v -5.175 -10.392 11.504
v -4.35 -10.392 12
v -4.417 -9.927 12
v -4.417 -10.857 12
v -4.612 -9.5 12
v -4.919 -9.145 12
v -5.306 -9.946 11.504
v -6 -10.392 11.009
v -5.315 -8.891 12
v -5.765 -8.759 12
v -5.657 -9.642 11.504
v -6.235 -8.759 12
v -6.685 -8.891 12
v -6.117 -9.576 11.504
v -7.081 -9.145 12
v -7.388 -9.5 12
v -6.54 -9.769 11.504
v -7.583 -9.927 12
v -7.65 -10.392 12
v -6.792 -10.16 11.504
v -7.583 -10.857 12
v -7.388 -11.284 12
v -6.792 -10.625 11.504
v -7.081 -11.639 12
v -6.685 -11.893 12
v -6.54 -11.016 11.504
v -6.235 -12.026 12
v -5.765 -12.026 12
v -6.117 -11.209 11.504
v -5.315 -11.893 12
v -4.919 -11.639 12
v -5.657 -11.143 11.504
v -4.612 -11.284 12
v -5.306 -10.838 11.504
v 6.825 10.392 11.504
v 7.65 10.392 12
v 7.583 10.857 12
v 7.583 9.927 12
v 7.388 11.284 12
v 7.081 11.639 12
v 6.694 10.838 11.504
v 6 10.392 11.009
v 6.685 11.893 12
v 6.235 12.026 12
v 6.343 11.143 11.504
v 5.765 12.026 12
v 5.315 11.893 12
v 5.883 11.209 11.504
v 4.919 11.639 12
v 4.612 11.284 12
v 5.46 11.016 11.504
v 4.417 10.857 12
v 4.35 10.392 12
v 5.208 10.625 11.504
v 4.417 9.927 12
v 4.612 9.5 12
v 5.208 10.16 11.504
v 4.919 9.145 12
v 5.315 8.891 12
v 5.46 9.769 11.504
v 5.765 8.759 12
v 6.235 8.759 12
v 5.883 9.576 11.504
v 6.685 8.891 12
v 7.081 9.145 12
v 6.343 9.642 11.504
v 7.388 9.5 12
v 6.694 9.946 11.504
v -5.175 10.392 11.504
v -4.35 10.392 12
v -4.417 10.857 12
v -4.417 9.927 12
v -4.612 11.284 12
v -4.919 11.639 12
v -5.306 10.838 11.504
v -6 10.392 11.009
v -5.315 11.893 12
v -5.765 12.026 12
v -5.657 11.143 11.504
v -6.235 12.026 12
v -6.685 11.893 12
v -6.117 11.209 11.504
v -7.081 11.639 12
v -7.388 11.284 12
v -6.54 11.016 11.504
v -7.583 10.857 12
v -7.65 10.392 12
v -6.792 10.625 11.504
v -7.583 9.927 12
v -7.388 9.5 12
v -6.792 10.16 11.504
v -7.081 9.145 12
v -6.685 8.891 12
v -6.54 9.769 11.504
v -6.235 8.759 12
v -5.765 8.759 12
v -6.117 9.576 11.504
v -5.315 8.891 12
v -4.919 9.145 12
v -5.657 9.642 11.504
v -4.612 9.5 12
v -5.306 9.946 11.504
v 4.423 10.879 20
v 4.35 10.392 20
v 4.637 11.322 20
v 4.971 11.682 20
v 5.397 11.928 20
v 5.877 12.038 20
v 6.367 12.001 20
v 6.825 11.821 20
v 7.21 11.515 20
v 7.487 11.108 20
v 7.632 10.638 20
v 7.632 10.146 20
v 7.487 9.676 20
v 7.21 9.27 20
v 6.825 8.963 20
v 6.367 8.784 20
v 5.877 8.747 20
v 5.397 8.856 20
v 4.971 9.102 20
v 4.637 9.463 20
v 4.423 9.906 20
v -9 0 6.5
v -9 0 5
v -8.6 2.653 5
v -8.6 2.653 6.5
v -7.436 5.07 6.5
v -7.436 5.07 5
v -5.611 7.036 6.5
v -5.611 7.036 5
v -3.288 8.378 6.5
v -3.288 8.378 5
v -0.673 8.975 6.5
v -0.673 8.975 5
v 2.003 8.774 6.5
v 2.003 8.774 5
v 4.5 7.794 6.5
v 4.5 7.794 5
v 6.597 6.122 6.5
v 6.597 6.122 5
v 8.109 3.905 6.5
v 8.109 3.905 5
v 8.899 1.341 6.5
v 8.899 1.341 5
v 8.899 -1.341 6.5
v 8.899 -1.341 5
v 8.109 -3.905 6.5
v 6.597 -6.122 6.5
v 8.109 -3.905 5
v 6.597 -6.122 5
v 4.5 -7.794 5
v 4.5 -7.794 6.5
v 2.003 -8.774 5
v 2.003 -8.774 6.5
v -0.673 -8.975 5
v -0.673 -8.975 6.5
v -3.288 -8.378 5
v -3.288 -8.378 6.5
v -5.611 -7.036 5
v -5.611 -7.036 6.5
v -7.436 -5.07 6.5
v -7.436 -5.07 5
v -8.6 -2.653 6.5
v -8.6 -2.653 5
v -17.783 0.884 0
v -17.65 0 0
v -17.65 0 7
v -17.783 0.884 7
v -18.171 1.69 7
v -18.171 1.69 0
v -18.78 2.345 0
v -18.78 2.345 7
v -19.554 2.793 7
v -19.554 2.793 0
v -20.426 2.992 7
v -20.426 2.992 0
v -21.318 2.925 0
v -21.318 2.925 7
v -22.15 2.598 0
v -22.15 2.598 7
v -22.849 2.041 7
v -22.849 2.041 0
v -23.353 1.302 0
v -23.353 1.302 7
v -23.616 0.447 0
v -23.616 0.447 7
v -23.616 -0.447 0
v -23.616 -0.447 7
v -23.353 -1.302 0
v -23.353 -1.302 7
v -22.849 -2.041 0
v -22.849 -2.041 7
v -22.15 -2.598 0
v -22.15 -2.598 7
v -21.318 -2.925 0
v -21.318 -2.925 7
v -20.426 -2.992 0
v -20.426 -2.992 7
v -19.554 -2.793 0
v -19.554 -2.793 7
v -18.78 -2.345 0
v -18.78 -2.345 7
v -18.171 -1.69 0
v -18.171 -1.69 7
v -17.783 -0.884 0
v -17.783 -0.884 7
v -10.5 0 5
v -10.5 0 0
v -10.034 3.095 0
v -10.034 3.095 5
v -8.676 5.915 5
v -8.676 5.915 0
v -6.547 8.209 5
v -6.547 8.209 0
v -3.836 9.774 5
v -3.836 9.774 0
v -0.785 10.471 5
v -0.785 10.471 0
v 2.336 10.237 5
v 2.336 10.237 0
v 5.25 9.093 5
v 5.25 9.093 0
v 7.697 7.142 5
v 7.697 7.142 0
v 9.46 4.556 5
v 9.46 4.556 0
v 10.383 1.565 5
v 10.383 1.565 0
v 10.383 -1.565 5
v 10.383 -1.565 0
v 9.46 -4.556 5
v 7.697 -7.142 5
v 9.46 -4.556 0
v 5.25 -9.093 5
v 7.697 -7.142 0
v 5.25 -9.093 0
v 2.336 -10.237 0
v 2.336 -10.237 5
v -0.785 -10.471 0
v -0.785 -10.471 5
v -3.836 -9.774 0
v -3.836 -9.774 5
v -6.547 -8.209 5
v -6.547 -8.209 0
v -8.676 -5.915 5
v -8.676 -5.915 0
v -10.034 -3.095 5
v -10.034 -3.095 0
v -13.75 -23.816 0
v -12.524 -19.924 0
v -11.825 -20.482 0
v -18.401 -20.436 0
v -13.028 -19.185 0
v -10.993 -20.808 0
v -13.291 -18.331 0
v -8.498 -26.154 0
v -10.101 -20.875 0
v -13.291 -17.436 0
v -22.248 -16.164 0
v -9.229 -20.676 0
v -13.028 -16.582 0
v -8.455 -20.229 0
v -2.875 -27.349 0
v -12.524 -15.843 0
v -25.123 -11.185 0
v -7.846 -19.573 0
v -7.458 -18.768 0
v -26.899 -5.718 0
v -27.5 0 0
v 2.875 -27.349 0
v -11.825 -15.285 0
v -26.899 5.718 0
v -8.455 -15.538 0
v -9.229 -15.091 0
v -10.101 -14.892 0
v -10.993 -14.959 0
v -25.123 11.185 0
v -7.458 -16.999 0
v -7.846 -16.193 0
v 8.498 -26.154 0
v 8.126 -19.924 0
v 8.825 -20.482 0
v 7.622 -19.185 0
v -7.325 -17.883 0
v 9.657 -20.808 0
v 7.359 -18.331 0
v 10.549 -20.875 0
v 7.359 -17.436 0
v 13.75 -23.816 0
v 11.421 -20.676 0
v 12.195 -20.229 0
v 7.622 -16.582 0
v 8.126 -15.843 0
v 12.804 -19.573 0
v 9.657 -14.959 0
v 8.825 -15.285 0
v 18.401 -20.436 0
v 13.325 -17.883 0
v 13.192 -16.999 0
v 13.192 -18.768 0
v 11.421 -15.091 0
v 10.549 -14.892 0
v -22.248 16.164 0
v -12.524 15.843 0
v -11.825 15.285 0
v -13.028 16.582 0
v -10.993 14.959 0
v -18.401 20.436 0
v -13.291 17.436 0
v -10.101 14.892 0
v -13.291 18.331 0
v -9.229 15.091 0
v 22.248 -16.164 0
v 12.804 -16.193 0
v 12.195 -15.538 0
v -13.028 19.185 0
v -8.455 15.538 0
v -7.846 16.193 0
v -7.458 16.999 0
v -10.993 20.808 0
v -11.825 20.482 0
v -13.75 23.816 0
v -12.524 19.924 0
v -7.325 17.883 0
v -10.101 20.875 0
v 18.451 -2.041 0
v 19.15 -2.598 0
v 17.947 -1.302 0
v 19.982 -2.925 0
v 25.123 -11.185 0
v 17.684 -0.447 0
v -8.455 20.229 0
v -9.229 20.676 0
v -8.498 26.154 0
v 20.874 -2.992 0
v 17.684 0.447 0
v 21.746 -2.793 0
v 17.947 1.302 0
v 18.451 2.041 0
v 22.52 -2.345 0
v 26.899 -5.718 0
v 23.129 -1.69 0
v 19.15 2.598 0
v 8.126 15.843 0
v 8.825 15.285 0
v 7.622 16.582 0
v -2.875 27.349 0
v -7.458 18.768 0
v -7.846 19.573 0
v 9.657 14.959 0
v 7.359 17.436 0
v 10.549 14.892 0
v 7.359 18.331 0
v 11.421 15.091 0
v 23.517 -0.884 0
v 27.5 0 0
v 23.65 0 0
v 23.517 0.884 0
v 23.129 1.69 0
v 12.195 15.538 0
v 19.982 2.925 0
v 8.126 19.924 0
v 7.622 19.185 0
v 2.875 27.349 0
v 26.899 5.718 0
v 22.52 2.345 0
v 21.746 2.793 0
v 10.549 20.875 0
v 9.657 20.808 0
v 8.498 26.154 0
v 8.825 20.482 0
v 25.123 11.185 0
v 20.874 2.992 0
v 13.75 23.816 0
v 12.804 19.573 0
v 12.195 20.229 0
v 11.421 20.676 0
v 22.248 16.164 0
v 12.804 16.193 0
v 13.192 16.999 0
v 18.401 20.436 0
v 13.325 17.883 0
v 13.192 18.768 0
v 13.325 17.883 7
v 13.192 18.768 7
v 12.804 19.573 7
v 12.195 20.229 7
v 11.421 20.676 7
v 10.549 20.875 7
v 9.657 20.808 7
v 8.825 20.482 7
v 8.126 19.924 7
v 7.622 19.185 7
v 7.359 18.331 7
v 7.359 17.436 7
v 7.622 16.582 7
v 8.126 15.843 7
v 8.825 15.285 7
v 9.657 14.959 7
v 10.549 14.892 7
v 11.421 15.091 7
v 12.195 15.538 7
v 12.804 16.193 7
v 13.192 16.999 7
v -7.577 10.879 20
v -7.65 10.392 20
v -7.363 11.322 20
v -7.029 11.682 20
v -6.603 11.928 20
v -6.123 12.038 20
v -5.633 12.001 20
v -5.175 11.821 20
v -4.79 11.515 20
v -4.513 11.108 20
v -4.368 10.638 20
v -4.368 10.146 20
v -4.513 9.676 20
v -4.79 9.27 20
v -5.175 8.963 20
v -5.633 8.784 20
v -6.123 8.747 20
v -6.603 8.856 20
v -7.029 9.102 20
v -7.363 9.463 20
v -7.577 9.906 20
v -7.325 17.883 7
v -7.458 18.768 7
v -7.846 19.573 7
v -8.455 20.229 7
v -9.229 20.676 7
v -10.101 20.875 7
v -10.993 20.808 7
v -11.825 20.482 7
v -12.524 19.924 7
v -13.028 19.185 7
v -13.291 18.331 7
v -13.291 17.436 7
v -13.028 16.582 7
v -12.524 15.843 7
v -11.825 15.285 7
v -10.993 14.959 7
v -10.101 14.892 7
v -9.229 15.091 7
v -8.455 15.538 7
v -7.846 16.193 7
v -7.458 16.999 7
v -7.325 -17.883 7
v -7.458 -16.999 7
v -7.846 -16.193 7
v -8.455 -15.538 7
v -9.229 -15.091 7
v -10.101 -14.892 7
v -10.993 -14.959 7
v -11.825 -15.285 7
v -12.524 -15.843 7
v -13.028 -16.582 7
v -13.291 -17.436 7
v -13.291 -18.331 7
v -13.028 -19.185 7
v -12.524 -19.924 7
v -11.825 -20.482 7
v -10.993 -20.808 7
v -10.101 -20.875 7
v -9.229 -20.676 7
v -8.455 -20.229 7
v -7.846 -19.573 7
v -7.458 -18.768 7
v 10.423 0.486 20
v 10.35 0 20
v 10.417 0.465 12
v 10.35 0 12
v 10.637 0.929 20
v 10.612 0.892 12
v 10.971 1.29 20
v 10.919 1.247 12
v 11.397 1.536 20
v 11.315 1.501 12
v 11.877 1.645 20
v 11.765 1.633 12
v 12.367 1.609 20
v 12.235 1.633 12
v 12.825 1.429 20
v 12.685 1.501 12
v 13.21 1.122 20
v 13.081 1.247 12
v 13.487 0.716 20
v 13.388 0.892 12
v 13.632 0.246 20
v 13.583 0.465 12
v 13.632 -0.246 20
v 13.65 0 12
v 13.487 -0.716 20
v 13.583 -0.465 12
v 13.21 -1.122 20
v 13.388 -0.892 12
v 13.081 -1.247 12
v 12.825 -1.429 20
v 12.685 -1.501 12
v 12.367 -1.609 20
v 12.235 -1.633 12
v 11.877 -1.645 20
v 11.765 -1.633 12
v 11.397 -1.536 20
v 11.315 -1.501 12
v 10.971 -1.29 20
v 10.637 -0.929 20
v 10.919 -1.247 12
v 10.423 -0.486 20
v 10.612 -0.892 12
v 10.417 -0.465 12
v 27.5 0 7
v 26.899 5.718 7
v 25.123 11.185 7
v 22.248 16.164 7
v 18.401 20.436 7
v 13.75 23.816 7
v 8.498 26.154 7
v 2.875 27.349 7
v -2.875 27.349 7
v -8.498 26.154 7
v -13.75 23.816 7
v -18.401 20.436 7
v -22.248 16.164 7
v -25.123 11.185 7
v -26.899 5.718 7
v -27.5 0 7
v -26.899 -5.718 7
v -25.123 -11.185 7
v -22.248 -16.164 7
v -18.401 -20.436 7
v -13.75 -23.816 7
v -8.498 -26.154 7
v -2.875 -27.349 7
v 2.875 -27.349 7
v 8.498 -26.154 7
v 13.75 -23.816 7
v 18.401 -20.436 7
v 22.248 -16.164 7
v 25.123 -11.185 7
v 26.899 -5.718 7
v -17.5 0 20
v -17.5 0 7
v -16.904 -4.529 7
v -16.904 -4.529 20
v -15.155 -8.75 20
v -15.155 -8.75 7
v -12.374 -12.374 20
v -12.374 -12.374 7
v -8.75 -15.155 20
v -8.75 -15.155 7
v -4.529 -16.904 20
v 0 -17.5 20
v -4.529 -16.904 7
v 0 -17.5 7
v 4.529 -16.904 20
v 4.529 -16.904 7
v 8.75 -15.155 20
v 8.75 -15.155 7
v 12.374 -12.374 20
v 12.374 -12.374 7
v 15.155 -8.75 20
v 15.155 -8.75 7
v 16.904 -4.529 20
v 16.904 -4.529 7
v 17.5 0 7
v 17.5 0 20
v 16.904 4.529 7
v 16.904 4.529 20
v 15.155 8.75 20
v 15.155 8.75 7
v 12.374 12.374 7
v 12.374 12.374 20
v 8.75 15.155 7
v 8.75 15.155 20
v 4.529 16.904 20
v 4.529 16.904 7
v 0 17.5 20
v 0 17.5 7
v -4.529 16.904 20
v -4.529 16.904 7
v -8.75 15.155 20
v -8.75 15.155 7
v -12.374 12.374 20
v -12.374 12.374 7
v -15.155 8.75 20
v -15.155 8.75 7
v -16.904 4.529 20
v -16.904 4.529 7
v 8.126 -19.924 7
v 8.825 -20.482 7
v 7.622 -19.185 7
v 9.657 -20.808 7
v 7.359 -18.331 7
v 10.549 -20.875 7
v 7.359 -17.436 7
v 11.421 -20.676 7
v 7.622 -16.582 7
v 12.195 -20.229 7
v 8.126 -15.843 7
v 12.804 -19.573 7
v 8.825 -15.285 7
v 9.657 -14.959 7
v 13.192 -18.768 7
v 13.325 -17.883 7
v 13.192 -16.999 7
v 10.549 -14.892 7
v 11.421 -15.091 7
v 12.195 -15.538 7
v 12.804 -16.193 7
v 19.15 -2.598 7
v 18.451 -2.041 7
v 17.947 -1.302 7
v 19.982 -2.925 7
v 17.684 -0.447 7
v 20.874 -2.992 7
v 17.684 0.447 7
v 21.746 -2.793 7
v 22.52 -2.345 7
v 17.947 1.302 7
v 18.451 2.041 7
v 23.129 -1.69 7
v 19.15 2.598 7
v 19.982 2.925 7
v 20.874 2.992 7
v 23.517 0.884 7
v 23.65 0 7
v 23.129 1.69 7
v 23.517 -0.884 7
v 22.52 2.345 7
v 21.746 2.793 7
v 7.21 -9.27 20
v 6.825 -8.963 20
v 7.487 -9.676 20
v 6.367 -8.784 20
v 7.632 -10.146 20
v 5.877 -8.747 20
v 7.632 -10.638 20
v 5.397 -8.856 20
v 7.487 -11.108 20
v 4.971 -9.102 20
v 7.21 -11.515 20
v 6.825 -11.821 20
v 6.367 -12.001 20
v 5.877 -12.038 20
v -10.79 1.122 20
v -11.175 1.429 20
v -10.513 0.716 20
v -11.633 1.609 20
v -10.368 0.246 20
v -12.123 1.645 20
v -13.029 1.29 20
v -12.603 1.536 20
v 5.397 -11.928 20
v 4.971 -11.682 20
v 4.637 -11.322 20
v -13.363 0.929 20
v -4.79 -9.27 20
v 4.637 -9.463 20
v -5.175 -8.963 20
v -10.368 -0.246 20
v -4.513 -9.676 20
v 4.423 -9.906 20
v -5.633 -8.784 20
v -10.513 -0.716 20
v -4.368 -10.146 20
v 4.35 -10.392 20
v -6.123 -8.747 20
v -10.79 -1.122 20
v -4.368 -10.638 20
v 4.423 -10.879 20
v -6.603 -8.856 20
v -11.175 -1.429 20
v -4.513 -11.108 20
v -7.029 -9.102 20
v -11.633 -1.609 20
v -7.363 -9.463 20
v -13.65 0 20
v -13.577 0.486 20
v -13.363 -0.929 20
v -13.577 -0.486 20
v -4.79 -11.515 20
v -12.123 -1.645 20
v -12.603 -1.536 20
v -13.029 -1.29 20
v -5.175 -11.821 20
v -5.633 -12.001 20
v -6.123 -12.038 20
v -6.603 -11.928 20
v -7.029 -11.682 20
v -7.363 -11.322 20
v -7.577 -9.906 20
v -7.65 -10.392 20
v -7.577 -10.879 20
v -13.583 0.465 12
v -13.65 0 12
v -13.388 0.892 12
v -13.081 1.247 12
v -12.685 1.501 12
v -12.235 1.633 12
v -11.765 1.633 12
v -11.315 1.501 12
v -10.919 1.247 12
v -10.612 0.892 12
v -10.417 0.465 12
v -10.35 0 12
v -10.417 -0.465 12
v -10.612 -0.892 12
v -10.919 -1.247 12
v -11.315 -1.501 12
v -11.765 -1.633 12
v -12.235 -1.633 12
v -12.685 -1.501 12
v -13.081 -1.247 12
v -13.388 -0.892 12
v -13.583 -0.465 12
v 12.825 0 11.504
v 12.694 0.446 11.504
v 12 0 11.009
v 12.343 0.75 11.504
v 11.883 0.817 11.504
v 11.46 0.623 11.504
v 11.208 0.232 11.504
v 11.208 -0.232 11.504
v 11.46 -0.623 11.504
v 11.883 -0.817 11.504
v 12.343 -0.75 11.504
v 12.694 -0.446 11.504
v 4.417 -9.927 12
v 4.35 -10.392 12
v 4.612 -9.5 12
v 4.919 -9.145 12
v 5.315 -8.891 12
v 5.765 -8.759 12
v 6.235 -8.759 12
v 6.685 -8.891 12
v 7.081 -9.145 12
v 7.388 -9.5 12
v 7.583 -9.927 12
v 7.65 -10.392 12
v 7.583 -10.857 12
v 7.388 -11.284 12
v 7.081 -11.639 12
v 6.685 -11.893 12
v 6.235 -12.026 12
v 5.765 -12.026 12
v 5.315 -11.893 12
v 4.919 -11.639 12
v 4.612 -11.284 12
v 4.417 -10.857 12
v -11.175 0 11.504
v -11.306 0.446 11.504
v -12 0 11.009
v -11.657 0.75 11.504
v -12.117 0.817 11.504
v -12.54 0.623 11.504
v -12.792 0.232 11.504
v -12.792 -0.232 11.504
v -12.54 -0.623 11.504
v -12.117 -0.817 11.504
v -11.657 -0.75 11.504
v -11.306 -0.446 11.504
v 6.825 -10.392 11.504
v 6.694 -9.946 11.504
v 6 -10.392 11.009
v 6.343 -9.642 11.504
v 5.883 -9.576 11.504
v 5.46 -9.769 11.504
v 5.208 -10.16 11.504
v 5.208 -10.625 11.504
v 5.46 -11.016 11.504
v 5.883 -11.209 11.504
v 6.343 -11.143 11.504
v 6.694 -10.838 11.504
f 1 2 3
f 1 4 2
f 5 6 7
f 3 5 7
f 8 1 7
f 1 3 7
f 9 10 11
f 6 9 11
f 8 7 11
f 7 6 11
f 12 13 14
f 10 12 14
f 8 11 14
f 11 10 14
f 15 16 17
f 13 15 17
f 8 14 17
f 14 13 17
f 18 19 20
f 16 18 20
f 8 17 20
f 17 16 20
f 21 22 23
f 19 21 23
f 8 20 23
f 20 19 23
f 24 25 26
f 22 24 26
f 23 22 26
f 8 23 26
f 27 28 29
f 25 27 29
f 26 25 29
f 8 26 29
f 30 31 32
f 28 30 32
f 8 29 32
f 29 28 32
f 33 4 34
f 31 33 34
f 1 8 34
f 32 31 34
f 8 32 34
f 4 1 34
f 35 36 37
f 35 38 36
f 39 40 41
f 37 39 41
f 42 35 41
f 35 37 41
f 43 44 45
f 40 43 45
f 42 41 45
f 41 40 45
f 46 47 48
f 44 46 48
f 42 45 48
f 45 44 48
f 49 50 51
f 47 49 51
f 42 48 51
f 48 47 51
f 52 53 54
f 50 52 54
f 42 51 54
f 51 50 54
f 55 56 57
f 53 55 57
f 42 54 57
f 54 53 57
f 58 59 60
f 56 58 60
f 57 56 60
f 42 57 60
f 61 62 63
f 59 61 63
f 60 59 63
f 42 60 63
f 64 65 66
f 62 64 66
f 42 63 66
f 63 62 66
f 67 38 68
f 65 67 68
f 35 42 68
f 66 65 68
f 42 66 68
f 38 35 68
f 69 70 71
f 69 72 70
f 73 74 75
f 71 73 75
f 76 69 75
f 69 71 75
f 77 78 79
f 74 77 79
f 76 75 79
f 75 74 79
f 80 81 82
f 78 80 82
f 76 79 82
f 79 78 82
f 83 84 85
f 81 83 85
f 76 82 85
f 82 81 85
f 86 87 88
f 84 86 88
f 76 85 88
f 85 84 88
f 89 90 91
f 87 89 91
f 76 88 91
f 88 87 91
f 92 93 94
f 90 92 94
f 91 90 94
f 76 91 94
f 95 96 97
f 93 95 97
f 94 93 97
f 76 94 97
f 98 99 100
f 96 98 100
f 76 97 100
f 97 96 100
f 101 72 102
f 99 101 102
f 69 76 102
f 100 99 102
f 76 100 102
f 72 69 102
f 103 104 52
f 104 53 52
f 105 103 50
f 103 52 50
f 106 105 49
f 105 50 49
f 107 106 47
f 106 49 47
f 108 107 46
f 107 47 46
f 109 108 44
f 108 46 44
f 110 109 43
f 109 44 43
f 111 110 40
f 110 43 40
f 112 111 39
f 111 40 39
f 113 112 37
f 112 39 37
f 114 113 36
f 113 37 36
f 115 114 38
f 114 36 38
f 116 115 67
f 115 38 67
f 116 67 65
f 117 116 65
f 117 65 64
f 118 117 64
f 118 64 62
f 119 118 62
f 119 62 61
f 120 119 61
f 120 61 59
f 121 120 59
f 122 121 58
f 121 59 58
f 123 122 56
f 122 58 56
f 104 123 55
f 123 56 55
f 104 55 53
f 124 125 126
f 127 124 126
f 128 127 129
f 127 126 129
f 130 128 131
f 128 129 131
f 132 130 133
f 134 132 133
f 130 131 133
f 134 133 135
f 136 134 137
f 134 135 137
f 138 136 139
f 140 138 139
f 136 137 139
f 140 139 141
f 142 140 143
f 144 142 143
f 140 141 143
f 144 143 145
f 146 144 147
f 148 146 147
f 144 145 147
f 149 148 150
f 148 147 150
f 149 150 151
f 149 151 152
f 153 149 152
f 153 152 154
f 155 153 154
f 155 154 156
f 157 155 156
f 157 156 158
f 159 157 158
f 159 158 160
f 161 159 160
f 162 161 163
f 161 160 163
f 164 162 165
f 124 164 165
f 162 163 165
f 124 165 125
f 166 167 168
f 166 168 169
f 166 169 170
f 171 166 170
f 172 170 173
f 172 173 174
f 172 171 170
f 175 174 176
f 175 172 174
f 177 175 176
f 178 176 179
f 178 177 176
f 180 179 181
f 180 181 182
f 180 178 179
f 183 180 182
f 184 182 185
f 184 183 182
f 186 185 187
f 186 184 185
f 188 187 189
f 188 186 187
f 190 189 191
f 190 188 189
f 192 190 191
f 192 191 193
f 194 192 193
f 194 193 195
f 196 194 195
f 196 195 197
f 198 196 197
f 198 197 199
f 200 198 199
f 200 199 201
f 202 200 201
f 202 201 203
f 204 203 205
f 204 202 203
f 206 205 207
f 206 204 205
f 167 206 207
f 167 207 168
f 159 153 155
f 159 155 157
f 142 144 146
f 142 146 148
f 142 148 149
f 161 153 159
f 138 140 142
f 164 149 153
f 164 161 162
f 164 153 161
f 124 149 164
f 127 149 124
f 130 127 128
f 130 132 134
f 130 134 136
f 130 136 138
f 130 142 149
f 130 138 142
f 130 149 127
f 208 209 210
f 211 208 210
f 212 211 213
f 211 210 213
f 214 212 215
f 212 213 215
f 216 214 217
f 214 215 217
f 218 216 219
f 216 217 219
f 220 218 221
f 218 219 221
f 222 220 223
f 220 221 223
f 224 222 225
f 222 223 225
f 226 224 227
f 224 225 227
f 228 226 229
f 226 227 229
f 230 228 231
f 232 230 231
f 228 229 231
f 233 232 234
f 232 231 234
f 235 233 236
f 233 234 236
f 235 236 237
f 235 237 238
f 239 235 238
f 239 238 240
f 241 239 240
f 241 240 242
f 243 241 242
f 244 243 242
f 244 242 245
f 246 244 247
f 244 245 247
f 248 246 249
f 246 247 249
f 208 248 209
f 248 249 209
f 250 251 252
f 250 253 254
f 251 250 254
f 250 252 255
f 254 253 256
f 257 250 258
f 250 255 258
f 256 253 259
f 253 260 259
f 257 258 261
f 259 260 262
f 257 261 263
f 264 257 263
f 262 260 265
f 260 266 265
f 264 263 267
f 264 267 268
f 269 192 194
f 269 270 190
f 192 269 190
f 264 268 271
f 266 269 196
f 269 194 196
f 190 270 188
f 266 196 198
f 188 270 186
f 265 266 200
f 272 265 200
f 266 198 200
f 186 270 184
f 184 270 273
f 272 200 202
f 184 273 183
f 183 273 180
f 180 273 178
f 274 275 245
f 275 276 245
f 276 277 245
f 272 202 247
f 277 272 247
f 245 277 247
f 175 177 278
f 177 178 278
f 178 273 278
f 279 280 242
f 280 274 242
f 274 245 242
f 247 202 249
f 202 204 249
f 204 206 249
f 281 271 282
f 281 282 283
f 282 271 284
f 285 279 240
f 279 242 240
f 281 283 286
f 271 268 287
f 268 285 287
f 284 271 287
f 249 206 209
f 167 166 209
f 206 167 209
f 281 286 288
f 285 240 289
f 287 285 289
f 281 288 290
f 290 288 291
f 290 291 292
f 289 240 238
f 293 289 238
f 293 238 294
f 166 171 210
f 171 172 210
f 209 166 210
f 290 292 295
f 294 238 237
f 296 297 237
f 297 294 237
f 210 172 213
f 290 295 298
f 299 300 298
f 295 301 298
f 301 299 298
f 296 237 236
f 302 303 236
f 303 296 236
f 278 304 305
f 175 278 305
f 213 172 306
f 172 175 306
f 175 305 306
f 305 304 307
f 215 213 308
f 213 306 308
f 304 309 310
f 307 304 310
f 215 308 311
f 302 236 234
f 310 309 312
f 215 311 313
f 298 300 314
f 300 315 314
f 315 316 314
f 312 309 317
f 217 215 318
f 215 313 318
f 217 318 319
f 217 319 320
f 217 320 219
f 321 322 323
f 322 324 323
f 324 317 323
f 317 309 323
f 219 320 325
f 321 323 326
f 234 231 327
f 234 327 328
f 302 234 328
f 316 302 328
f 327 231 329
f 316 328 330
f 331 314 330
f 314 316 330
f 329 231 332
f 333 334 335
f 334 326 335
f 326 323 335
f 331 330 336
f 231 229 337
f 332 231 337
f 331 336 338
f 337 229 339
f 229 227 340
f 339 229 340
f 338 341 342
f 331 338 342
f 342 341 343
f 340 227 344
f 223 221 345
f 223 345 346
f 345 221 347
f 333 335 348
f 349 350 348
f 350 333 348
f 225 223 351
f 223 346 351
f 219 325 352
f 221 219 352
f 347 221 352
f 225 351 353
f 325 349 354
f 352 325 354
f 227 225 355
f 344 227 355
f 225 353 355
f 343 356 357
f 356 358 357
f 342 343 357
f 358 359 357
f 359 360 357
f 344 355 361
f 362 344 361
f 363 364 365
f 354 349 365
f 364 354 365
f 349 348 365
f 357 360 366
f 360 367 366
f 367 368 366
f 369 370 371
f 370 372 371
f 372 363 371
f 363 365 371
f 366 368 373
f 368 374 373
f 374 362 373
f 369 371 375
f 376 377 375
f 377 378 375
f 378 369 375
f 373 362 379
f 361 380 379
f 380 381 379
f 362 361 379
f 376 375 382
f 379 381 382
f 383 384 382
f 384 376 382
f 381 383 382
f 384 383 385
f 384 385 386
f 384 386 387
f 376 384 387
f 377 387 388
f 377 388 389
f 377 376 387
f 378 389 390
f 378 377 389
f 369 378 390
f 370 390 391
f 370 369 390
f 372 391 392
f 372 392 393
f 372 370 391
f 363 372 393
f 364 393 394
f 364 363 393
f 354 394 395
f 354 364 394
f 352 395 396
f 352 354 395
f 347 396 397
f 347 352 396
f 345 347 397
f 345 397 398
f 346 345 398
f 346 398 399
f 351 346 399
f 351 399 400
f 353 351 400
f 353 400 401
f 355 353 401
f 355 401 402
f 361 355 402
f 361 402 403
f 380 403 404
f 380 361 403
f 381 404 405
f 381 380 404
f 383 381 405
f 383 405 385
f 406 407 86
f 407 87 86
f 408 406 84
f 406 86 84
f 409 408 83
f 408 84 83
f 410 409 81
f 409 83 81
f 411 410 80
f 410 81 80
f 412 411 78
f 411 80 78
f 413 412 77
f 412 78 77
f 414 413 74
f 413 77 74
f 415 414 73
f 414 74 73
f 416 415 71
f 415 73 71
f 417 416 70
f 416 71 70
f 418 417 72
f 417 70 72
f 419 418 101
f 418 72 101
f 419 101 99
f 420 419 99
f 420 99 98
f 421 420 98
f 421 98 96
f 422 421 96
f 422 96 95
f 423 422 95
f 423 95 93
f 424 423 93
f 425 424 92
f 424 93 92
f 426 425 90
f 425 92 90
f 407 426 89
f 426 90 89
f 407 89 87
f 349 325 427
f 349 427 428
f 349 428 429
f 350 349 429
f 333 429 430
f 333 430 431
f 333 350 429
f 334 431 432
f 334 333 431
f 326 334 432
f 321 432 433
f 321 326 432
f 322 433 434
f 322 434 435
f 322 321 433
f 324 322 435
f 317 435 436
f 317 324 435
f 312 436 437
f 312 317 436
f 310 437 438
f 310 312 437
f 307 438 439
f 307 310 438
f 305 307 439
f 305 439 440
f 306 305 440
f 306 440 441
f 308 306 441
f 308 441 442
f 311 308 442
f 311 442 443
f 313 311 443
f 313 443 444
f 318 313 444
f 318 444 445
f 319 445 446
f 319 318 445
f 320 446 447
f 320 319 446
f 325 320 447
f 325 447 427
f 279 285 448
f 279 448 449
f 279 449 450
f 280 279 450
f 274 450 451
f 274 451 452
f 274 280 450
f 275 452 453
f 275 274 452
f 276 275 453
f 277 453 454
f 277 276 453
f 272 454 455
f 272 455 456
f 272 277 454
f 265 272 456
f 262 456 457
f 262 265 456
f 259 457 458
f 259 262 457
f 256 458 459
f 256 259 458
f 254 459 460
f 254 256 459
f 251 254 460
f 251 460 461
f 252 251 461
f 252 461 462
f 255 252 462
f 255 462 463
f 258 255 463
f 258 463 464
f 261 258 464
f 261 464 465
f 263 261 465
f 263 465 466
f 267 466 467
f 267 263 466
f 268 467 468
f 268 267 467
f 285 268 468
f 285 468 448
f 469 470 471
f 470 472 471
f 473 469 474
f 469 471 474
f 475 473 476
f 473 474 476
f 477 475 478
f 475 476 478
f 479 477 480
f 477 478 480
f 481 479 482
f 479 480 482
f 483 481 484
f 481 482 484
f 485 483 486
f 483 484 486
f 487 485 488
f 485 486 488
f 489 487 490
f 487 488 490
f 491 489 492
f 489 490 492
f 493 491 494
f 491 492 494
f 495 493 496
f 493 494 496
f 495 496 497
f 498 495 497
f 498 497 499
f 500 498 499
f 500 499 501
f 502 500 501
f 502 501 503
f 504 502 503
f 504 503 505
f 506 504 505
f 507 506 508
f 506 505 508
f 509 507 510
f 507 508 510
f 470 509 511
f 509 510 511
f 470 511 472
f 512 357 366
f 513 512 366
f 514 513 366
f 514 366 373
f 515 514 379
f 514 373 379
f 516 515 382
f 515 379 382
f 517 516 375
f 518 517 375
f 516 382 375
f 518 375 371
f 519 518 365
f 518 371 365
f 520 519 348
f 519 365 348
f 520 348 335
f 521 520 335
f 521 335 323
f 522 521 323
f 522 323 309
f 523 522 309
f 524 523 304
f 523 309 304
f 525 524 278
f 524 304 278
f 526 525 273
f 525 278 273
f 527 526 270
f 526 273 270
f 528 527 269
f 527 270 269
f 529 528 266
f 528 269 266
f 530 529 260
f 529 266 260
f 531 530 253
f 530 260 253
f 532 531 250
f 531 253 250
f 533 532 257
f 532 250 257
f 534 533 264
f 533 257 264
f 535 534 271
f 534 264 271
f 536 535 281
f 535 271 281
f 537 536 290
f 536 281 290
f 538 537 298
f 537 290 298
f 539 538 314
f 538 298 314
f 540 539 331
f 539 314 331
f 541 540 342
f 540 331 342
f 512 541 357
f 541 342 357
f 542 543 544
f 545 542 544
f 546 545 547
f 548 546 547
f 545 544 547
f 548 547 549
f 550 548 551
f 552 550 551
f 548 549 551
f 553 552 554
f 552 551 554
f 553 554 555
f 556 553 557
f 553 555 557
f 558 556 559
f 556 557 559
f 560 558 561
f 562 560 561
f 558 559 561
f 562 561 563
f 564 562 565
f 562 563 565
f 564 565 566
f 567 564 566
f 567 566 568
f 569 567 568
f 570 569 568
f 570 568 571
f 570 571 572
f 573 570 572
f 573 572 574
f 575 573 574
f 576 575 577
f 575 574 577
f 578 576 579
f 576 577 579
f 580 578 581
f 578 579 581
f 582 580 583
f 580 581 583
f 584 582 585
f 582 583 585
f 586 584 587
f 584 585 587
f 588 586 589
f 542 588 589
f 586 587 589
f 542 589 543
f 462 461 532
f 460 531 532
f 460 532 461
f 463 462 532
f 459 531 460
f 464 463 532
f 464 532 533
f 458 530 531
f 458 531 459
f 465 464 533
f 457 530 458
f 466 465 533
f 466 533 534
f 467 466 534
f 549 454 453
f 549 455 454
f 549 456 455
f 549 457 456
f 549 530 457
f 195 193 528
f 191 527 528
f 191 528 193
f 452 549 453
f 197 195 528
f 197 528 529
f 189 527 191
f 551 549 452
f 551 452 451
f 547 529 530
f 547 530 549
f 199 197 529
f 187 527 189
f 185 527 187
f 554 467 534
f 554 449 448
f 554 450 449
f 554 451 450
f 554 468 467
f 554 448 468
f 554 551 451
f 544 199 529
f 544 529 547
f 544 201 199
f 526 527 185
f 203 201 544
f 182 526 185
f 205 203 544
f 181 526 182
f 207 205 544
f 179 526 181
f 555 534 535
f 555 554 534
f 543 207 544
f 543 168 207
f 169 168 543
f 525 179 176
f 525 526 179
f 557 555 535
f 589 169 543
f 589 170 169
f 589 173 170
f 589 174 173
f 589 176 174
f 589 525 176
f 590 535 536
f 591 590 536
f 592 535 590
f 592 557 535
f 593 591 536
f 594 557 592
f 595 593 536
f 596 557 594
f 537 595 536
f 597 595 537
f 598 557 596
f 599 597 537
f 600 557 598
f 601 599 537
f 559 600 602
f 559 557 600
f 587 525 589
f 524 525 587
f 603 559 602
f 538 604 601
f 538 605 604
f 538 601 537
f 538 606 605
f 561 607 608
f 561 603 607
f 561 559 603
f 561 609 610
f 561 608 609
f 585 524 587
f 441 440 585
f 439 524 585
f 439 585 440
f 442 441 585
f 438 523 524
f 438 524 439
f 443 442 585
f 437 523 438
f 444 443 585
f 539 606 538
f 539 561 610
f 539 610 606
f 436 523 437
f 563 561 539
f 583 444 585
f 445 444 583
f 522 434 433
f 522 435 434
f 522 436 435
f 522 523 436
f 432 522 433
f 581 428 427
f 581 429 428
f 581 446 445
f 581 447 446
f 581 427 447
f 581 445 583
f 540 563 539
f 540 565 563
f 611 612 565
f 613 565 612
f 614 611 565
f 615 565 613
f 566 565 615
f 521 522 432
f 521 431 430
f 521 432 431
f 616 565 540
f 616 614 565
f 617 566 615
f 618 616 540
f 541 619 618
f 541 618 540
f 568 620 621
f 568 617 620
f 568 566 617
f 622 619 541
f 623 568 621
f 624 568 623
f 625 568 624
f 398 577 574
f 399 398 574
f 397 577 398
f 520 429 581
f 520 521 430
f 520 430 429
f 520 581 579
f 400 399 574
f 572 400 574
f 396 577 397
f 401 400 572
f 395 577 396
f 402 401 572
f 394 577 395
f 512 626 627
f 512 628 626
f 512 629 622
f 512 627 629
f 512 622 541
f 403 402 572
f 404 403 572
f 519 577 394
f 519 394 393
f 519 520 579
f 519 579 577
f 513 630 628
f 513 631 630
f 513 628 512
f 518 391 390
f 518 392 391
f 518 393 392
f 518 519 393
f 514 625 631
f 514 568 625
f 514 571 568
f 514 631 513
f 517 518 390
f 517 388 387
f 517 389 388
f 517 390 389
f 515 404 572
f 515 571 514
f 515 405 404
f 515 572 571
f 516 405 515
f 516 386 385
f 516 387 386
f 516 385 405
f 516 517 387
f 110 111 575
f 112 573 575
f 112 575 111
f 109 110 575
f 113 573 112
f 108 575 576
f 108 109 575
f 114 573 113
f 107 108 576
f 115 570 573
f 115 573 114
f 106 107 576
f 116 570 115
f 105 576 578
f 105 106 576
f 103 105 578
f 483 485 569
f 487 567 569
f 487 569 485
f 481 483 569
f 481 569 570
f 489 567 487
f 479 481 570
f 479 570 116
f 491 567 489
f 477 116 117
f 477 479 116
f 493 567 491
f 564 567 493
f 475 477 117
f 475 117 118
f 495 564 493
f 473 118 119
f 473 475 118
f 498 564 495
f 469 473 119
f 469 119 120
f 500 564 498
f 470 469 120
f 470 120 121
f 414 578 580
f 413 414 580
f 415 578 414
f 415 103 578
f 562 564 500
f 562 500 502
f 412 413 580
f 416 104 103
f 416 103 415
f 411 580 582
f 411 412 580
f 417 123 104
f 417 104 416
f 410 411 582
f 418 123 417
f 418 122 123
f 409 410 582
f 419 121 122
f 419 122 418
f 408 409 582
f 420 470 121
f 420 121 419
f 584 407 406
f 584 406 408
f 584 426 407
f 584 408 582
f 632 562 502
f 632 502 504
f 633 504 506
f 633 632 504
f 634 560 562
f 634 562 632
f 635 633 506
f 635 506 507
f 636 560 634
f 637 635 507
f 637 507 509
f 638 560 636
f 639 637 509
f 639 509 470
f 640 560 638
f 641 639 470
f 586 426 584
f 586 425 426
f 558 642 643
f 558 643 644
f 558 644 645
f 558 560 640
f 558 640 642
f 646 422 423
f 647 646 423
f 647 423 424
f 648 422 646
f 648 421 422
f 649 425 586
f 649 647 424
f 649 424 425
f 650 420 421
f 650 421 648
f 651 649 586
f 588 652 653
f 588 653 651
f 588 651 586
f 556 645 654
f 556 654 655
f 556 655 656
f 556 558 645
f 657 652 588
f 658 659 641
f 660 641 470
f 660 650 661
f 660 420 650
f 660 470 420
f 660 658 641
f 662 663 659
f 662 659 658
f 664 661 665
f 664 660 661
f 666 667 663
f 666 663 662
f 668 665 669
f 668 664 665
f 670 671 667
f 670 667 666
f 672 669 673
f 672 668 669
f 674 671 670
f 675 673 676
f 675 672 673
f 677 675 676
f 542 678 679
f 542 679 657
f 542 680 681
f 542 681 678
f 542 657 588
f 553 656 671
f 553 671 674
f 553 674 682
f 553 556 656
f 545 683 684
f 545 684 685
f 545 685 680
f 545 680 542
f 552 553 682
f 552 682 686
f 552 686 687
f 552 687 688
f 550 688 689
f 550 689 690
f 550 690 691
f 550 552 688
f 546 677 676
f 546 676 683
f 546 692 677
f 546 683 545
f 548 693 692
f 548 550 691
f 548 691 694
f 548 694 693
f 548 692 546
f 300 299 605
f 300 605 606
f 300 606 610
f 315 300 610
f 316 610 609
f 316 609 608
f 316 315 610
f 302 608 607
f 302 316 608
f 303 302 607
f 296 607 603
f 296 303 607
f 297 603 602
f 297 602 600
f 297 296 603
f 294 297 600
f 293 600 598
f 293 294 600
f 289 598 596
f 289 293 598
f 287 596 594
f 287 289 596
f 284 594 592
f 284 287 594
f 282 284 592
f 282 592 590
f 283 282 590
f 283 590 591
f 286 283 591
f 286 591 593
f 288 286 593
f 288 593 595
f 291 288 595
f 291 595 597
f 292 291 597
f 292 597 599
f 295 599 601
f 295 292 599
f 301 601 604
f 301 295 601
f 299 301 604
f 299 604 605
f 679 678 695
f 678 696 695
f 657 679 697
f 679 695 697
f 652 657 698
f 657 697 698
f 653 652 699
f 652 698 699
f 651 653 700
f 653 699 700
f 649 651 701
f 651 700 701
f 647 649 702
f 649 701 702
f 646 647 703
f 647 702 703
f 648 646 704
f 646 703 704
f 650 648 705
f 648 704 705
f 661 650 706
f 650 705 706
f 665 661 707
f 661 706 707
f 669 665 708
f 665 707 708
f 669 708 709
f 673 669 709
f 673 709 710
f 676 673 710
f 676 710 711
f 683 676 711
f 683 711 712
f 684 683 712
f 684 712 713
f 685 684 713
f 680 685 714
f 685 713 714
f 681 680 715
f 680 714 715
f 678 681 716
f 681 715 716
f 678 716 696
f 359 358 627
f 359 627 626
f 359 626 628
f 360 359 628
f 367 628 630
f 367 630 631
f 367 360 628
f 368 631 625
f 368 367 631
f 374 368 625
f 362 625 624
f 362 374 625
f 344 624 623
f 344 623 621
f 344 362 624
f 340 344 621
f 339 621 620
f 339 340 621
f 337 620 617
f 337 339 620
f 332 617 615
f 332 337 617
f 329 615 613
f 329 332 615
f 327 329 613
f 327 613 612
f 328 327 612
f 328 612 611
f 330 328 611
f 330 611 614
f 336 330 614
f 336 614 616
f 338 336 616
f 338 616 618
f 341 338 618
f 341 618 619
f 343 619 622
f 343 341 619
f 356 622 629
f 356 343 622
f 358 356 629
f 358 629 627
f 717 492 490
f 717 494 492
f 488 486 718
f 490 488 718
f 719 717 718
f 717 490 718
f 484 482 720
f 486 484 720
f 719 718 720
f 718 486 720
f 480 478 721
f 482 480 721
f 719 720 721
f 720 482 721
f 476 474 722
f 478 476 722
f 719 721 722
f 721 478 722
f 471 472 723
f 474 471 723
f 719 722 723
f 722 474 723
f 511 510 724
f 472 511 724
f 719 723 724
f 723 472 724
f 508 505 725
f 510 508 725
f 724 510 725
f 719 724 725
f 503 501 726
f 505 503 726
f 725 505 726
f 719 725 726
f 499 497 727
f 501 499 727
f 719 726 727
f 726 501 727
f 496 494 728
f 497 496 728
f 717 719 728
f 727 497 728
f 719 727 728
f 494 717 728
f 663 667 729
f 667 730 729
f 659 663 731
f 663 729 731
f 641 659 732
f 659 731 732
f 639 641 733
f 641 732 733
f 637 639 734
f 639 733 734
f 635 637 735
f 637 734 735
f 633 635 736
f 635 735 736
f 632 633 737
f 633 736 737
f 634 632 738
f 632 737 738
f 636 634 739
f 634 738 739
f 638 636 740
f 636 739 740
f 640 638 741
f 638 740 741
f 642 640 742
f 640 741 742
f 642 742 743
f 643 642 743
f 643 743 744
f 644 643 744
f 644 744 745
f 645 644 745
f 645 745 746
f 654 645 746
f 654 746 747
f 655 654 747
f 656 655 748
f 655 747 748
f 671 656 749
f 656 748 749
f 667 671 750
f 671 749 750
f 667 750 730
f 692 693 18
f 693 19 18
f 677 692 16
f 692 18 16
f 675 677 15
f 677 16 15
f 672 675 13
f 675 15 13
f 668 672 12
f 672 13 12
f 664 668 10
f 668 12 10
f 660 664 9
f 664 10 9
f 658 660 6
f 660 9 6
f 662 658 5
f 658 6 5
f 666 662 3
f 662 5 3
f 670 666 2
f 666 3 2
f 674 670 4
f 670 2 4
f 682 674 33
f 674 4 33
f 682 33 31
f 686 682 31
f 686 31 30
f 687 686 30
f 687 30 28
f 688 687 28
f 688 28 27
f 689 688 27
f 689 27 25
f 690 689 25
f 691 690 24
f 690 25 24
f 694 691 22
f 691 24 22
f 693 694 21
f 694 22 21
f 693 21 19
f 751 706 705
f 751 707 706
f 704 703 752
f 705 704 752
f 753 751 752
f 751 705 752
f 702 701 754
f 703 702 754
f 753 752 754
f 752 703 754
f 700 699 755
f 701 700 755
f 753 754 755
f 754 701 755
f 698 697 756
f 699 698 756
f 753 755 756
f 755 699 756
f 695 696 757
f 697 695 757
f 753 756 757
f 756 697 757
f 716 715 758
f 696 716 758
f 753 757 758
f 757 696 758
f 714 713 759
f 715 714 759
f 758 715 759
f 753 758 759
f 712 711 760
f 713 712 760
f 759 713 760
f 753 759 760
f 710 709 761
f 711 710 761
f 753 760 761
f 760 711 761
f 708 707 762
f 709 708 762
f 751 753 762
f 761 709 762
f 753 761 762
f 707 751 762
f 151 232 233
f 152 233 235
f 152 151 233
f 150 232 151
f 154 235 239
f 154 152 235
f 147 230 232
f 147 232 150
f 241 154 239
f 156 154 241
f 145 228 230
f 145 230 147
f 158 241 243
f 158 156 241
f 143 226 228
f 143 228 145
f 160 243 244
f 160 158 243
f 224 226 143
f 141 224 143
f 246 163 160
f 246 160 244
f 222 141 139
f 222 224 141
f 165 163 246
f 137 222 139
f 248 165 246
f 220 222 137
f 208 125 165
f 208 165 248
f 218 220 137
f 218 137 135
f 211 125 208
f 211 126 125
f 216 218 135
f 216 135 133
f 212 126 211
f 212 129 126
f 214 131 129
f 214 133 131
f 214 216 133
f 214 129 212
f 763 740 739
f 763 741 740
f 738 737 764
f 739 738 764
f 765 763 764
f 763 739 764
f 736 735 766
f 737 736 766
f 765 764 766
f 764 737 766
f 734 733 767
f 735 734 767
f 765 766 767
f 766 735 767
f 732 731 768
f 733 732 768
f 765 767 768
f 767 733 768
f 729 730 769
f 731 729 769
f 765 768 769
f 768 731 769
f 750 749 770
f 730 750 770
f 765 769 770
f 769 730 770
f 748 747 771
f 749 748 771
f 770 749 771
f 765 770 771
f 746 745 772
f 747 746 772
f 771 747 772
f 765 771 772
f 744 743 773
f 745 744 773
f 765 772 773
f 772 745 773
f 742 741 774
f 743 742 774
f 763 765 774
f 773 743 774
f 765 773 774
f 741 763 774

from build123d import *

# Parameters (mm, degrees)
SKETCH1_R             = 27.5
SKETCH1_R_2           = 3
BOSS_EXTRUDE1_DEPTH   = 7
SKETCH2_R             = 10.5
CUT_EXTRUDE1_DEPTH    = 5
SKETCH4_R             = 17.5
BOSS_EXTRUDE2_DEPTH   = 13
SKETCH6_R             = 9
CUT_EXTRUDE3_DEPTH    = 1.5
M4_TAPPED_HOLE1_D     = 3.3
M4_TAPPED_HOLE1_DEPTH = 8
M4_TAPPED_HOLE1_TIP   = 0.991420021


with BuildPart() as part:
    # Sketch1 → Boss-Extrude1 (new body)
    with BuildSketch(Plane.XY):
        Circle(SKETCH1_R)
        with Locations((20.65, 0)):
            Circle(SKETCH1_R_2, mode=Mode.SUBTRACT)
        with Locations((10.325, -17.883424588)):
            Circle(SKETCH1_R_2, mode=Mode.SUBTRACT)
        with Locations((-10.325, -17.883424588)):
            Circle(SKETCH1_R_2, mode=Mode.SUBTRACT)
        with Locations((-20.65, 0)):
            Circle(SKETCH1_R_2, mode=Mode.SUBTRACT)
        with Locations((-10.325, 17.883424588)):
            Circle(SKETCH1_R_2, mode=Mode.SUBTRACT)
        with Locations((10.325, 17.883424588)):
            Circle(SKETCH1_R_2, mode=Mode.SUBTRACT)
    extrude(amount=BOSS_EXTRUDE1_DEPTH)

    # Sketch2 → Cut-Extrude1 (cut)
    with BuildSketch(Plane(origin=(0, 0, 0), x_dir=(-1, 0, 0), z_dir=(0, 0, -1))):
        Circle(SKETCH2_R)
    extrude(amount=-CUT_EXTRUDE1_DEPTH, mode=Mode.SUBTRACT)

    # Sketch4 → Boss-Extrude2 (add)
    with BuildSketch(Plane.XY.offset(7)):
        Circle(SKETCH4_R)
    extrude(amount=BOSS_EXTRUDE2_DEPTH)

    # Sketch6 → Cut-Extrude3 (cut)
    with BuildSketch(Plane(origin=(0, 0, 5), x_dir=(-1, 0, 0), z_dir=(0, 0, -1))):
        Circle(SKETCH6_R)
    extrude(amount=-CUT_EXTRUDE3_DEPTH, mode=Mode.SUBTRACT)

    # M4 Tapped Hole1
    with Locations(Plane(origin=(-6, 10.392304845, 20), x_dir=(1, 0, 0), z_dir=(0, 0, 1))):
        with Locations((0, 0), (12, 0), (18, -10.392304845), (12, -20.78460969), (0, -20.78460969), (-6, -10.392304845)):
            Hole(M4_TAPPED_HOLE1_D / 2, depth=M4_TAPPED_HOLE1_DEPTH)
            with Locations((0, 0, -(M4_TAPPED_HOLE1_DEPTH + M4_TAPPED_HOLE1_TIP / 2))):  # 118° drill point
                Cone(0, M4_TAPPED_HOLE1_D / 2, M4_TAPPED_HOLE1_TIP, mode=Mode.SUBTRACT)


solid = part.part
